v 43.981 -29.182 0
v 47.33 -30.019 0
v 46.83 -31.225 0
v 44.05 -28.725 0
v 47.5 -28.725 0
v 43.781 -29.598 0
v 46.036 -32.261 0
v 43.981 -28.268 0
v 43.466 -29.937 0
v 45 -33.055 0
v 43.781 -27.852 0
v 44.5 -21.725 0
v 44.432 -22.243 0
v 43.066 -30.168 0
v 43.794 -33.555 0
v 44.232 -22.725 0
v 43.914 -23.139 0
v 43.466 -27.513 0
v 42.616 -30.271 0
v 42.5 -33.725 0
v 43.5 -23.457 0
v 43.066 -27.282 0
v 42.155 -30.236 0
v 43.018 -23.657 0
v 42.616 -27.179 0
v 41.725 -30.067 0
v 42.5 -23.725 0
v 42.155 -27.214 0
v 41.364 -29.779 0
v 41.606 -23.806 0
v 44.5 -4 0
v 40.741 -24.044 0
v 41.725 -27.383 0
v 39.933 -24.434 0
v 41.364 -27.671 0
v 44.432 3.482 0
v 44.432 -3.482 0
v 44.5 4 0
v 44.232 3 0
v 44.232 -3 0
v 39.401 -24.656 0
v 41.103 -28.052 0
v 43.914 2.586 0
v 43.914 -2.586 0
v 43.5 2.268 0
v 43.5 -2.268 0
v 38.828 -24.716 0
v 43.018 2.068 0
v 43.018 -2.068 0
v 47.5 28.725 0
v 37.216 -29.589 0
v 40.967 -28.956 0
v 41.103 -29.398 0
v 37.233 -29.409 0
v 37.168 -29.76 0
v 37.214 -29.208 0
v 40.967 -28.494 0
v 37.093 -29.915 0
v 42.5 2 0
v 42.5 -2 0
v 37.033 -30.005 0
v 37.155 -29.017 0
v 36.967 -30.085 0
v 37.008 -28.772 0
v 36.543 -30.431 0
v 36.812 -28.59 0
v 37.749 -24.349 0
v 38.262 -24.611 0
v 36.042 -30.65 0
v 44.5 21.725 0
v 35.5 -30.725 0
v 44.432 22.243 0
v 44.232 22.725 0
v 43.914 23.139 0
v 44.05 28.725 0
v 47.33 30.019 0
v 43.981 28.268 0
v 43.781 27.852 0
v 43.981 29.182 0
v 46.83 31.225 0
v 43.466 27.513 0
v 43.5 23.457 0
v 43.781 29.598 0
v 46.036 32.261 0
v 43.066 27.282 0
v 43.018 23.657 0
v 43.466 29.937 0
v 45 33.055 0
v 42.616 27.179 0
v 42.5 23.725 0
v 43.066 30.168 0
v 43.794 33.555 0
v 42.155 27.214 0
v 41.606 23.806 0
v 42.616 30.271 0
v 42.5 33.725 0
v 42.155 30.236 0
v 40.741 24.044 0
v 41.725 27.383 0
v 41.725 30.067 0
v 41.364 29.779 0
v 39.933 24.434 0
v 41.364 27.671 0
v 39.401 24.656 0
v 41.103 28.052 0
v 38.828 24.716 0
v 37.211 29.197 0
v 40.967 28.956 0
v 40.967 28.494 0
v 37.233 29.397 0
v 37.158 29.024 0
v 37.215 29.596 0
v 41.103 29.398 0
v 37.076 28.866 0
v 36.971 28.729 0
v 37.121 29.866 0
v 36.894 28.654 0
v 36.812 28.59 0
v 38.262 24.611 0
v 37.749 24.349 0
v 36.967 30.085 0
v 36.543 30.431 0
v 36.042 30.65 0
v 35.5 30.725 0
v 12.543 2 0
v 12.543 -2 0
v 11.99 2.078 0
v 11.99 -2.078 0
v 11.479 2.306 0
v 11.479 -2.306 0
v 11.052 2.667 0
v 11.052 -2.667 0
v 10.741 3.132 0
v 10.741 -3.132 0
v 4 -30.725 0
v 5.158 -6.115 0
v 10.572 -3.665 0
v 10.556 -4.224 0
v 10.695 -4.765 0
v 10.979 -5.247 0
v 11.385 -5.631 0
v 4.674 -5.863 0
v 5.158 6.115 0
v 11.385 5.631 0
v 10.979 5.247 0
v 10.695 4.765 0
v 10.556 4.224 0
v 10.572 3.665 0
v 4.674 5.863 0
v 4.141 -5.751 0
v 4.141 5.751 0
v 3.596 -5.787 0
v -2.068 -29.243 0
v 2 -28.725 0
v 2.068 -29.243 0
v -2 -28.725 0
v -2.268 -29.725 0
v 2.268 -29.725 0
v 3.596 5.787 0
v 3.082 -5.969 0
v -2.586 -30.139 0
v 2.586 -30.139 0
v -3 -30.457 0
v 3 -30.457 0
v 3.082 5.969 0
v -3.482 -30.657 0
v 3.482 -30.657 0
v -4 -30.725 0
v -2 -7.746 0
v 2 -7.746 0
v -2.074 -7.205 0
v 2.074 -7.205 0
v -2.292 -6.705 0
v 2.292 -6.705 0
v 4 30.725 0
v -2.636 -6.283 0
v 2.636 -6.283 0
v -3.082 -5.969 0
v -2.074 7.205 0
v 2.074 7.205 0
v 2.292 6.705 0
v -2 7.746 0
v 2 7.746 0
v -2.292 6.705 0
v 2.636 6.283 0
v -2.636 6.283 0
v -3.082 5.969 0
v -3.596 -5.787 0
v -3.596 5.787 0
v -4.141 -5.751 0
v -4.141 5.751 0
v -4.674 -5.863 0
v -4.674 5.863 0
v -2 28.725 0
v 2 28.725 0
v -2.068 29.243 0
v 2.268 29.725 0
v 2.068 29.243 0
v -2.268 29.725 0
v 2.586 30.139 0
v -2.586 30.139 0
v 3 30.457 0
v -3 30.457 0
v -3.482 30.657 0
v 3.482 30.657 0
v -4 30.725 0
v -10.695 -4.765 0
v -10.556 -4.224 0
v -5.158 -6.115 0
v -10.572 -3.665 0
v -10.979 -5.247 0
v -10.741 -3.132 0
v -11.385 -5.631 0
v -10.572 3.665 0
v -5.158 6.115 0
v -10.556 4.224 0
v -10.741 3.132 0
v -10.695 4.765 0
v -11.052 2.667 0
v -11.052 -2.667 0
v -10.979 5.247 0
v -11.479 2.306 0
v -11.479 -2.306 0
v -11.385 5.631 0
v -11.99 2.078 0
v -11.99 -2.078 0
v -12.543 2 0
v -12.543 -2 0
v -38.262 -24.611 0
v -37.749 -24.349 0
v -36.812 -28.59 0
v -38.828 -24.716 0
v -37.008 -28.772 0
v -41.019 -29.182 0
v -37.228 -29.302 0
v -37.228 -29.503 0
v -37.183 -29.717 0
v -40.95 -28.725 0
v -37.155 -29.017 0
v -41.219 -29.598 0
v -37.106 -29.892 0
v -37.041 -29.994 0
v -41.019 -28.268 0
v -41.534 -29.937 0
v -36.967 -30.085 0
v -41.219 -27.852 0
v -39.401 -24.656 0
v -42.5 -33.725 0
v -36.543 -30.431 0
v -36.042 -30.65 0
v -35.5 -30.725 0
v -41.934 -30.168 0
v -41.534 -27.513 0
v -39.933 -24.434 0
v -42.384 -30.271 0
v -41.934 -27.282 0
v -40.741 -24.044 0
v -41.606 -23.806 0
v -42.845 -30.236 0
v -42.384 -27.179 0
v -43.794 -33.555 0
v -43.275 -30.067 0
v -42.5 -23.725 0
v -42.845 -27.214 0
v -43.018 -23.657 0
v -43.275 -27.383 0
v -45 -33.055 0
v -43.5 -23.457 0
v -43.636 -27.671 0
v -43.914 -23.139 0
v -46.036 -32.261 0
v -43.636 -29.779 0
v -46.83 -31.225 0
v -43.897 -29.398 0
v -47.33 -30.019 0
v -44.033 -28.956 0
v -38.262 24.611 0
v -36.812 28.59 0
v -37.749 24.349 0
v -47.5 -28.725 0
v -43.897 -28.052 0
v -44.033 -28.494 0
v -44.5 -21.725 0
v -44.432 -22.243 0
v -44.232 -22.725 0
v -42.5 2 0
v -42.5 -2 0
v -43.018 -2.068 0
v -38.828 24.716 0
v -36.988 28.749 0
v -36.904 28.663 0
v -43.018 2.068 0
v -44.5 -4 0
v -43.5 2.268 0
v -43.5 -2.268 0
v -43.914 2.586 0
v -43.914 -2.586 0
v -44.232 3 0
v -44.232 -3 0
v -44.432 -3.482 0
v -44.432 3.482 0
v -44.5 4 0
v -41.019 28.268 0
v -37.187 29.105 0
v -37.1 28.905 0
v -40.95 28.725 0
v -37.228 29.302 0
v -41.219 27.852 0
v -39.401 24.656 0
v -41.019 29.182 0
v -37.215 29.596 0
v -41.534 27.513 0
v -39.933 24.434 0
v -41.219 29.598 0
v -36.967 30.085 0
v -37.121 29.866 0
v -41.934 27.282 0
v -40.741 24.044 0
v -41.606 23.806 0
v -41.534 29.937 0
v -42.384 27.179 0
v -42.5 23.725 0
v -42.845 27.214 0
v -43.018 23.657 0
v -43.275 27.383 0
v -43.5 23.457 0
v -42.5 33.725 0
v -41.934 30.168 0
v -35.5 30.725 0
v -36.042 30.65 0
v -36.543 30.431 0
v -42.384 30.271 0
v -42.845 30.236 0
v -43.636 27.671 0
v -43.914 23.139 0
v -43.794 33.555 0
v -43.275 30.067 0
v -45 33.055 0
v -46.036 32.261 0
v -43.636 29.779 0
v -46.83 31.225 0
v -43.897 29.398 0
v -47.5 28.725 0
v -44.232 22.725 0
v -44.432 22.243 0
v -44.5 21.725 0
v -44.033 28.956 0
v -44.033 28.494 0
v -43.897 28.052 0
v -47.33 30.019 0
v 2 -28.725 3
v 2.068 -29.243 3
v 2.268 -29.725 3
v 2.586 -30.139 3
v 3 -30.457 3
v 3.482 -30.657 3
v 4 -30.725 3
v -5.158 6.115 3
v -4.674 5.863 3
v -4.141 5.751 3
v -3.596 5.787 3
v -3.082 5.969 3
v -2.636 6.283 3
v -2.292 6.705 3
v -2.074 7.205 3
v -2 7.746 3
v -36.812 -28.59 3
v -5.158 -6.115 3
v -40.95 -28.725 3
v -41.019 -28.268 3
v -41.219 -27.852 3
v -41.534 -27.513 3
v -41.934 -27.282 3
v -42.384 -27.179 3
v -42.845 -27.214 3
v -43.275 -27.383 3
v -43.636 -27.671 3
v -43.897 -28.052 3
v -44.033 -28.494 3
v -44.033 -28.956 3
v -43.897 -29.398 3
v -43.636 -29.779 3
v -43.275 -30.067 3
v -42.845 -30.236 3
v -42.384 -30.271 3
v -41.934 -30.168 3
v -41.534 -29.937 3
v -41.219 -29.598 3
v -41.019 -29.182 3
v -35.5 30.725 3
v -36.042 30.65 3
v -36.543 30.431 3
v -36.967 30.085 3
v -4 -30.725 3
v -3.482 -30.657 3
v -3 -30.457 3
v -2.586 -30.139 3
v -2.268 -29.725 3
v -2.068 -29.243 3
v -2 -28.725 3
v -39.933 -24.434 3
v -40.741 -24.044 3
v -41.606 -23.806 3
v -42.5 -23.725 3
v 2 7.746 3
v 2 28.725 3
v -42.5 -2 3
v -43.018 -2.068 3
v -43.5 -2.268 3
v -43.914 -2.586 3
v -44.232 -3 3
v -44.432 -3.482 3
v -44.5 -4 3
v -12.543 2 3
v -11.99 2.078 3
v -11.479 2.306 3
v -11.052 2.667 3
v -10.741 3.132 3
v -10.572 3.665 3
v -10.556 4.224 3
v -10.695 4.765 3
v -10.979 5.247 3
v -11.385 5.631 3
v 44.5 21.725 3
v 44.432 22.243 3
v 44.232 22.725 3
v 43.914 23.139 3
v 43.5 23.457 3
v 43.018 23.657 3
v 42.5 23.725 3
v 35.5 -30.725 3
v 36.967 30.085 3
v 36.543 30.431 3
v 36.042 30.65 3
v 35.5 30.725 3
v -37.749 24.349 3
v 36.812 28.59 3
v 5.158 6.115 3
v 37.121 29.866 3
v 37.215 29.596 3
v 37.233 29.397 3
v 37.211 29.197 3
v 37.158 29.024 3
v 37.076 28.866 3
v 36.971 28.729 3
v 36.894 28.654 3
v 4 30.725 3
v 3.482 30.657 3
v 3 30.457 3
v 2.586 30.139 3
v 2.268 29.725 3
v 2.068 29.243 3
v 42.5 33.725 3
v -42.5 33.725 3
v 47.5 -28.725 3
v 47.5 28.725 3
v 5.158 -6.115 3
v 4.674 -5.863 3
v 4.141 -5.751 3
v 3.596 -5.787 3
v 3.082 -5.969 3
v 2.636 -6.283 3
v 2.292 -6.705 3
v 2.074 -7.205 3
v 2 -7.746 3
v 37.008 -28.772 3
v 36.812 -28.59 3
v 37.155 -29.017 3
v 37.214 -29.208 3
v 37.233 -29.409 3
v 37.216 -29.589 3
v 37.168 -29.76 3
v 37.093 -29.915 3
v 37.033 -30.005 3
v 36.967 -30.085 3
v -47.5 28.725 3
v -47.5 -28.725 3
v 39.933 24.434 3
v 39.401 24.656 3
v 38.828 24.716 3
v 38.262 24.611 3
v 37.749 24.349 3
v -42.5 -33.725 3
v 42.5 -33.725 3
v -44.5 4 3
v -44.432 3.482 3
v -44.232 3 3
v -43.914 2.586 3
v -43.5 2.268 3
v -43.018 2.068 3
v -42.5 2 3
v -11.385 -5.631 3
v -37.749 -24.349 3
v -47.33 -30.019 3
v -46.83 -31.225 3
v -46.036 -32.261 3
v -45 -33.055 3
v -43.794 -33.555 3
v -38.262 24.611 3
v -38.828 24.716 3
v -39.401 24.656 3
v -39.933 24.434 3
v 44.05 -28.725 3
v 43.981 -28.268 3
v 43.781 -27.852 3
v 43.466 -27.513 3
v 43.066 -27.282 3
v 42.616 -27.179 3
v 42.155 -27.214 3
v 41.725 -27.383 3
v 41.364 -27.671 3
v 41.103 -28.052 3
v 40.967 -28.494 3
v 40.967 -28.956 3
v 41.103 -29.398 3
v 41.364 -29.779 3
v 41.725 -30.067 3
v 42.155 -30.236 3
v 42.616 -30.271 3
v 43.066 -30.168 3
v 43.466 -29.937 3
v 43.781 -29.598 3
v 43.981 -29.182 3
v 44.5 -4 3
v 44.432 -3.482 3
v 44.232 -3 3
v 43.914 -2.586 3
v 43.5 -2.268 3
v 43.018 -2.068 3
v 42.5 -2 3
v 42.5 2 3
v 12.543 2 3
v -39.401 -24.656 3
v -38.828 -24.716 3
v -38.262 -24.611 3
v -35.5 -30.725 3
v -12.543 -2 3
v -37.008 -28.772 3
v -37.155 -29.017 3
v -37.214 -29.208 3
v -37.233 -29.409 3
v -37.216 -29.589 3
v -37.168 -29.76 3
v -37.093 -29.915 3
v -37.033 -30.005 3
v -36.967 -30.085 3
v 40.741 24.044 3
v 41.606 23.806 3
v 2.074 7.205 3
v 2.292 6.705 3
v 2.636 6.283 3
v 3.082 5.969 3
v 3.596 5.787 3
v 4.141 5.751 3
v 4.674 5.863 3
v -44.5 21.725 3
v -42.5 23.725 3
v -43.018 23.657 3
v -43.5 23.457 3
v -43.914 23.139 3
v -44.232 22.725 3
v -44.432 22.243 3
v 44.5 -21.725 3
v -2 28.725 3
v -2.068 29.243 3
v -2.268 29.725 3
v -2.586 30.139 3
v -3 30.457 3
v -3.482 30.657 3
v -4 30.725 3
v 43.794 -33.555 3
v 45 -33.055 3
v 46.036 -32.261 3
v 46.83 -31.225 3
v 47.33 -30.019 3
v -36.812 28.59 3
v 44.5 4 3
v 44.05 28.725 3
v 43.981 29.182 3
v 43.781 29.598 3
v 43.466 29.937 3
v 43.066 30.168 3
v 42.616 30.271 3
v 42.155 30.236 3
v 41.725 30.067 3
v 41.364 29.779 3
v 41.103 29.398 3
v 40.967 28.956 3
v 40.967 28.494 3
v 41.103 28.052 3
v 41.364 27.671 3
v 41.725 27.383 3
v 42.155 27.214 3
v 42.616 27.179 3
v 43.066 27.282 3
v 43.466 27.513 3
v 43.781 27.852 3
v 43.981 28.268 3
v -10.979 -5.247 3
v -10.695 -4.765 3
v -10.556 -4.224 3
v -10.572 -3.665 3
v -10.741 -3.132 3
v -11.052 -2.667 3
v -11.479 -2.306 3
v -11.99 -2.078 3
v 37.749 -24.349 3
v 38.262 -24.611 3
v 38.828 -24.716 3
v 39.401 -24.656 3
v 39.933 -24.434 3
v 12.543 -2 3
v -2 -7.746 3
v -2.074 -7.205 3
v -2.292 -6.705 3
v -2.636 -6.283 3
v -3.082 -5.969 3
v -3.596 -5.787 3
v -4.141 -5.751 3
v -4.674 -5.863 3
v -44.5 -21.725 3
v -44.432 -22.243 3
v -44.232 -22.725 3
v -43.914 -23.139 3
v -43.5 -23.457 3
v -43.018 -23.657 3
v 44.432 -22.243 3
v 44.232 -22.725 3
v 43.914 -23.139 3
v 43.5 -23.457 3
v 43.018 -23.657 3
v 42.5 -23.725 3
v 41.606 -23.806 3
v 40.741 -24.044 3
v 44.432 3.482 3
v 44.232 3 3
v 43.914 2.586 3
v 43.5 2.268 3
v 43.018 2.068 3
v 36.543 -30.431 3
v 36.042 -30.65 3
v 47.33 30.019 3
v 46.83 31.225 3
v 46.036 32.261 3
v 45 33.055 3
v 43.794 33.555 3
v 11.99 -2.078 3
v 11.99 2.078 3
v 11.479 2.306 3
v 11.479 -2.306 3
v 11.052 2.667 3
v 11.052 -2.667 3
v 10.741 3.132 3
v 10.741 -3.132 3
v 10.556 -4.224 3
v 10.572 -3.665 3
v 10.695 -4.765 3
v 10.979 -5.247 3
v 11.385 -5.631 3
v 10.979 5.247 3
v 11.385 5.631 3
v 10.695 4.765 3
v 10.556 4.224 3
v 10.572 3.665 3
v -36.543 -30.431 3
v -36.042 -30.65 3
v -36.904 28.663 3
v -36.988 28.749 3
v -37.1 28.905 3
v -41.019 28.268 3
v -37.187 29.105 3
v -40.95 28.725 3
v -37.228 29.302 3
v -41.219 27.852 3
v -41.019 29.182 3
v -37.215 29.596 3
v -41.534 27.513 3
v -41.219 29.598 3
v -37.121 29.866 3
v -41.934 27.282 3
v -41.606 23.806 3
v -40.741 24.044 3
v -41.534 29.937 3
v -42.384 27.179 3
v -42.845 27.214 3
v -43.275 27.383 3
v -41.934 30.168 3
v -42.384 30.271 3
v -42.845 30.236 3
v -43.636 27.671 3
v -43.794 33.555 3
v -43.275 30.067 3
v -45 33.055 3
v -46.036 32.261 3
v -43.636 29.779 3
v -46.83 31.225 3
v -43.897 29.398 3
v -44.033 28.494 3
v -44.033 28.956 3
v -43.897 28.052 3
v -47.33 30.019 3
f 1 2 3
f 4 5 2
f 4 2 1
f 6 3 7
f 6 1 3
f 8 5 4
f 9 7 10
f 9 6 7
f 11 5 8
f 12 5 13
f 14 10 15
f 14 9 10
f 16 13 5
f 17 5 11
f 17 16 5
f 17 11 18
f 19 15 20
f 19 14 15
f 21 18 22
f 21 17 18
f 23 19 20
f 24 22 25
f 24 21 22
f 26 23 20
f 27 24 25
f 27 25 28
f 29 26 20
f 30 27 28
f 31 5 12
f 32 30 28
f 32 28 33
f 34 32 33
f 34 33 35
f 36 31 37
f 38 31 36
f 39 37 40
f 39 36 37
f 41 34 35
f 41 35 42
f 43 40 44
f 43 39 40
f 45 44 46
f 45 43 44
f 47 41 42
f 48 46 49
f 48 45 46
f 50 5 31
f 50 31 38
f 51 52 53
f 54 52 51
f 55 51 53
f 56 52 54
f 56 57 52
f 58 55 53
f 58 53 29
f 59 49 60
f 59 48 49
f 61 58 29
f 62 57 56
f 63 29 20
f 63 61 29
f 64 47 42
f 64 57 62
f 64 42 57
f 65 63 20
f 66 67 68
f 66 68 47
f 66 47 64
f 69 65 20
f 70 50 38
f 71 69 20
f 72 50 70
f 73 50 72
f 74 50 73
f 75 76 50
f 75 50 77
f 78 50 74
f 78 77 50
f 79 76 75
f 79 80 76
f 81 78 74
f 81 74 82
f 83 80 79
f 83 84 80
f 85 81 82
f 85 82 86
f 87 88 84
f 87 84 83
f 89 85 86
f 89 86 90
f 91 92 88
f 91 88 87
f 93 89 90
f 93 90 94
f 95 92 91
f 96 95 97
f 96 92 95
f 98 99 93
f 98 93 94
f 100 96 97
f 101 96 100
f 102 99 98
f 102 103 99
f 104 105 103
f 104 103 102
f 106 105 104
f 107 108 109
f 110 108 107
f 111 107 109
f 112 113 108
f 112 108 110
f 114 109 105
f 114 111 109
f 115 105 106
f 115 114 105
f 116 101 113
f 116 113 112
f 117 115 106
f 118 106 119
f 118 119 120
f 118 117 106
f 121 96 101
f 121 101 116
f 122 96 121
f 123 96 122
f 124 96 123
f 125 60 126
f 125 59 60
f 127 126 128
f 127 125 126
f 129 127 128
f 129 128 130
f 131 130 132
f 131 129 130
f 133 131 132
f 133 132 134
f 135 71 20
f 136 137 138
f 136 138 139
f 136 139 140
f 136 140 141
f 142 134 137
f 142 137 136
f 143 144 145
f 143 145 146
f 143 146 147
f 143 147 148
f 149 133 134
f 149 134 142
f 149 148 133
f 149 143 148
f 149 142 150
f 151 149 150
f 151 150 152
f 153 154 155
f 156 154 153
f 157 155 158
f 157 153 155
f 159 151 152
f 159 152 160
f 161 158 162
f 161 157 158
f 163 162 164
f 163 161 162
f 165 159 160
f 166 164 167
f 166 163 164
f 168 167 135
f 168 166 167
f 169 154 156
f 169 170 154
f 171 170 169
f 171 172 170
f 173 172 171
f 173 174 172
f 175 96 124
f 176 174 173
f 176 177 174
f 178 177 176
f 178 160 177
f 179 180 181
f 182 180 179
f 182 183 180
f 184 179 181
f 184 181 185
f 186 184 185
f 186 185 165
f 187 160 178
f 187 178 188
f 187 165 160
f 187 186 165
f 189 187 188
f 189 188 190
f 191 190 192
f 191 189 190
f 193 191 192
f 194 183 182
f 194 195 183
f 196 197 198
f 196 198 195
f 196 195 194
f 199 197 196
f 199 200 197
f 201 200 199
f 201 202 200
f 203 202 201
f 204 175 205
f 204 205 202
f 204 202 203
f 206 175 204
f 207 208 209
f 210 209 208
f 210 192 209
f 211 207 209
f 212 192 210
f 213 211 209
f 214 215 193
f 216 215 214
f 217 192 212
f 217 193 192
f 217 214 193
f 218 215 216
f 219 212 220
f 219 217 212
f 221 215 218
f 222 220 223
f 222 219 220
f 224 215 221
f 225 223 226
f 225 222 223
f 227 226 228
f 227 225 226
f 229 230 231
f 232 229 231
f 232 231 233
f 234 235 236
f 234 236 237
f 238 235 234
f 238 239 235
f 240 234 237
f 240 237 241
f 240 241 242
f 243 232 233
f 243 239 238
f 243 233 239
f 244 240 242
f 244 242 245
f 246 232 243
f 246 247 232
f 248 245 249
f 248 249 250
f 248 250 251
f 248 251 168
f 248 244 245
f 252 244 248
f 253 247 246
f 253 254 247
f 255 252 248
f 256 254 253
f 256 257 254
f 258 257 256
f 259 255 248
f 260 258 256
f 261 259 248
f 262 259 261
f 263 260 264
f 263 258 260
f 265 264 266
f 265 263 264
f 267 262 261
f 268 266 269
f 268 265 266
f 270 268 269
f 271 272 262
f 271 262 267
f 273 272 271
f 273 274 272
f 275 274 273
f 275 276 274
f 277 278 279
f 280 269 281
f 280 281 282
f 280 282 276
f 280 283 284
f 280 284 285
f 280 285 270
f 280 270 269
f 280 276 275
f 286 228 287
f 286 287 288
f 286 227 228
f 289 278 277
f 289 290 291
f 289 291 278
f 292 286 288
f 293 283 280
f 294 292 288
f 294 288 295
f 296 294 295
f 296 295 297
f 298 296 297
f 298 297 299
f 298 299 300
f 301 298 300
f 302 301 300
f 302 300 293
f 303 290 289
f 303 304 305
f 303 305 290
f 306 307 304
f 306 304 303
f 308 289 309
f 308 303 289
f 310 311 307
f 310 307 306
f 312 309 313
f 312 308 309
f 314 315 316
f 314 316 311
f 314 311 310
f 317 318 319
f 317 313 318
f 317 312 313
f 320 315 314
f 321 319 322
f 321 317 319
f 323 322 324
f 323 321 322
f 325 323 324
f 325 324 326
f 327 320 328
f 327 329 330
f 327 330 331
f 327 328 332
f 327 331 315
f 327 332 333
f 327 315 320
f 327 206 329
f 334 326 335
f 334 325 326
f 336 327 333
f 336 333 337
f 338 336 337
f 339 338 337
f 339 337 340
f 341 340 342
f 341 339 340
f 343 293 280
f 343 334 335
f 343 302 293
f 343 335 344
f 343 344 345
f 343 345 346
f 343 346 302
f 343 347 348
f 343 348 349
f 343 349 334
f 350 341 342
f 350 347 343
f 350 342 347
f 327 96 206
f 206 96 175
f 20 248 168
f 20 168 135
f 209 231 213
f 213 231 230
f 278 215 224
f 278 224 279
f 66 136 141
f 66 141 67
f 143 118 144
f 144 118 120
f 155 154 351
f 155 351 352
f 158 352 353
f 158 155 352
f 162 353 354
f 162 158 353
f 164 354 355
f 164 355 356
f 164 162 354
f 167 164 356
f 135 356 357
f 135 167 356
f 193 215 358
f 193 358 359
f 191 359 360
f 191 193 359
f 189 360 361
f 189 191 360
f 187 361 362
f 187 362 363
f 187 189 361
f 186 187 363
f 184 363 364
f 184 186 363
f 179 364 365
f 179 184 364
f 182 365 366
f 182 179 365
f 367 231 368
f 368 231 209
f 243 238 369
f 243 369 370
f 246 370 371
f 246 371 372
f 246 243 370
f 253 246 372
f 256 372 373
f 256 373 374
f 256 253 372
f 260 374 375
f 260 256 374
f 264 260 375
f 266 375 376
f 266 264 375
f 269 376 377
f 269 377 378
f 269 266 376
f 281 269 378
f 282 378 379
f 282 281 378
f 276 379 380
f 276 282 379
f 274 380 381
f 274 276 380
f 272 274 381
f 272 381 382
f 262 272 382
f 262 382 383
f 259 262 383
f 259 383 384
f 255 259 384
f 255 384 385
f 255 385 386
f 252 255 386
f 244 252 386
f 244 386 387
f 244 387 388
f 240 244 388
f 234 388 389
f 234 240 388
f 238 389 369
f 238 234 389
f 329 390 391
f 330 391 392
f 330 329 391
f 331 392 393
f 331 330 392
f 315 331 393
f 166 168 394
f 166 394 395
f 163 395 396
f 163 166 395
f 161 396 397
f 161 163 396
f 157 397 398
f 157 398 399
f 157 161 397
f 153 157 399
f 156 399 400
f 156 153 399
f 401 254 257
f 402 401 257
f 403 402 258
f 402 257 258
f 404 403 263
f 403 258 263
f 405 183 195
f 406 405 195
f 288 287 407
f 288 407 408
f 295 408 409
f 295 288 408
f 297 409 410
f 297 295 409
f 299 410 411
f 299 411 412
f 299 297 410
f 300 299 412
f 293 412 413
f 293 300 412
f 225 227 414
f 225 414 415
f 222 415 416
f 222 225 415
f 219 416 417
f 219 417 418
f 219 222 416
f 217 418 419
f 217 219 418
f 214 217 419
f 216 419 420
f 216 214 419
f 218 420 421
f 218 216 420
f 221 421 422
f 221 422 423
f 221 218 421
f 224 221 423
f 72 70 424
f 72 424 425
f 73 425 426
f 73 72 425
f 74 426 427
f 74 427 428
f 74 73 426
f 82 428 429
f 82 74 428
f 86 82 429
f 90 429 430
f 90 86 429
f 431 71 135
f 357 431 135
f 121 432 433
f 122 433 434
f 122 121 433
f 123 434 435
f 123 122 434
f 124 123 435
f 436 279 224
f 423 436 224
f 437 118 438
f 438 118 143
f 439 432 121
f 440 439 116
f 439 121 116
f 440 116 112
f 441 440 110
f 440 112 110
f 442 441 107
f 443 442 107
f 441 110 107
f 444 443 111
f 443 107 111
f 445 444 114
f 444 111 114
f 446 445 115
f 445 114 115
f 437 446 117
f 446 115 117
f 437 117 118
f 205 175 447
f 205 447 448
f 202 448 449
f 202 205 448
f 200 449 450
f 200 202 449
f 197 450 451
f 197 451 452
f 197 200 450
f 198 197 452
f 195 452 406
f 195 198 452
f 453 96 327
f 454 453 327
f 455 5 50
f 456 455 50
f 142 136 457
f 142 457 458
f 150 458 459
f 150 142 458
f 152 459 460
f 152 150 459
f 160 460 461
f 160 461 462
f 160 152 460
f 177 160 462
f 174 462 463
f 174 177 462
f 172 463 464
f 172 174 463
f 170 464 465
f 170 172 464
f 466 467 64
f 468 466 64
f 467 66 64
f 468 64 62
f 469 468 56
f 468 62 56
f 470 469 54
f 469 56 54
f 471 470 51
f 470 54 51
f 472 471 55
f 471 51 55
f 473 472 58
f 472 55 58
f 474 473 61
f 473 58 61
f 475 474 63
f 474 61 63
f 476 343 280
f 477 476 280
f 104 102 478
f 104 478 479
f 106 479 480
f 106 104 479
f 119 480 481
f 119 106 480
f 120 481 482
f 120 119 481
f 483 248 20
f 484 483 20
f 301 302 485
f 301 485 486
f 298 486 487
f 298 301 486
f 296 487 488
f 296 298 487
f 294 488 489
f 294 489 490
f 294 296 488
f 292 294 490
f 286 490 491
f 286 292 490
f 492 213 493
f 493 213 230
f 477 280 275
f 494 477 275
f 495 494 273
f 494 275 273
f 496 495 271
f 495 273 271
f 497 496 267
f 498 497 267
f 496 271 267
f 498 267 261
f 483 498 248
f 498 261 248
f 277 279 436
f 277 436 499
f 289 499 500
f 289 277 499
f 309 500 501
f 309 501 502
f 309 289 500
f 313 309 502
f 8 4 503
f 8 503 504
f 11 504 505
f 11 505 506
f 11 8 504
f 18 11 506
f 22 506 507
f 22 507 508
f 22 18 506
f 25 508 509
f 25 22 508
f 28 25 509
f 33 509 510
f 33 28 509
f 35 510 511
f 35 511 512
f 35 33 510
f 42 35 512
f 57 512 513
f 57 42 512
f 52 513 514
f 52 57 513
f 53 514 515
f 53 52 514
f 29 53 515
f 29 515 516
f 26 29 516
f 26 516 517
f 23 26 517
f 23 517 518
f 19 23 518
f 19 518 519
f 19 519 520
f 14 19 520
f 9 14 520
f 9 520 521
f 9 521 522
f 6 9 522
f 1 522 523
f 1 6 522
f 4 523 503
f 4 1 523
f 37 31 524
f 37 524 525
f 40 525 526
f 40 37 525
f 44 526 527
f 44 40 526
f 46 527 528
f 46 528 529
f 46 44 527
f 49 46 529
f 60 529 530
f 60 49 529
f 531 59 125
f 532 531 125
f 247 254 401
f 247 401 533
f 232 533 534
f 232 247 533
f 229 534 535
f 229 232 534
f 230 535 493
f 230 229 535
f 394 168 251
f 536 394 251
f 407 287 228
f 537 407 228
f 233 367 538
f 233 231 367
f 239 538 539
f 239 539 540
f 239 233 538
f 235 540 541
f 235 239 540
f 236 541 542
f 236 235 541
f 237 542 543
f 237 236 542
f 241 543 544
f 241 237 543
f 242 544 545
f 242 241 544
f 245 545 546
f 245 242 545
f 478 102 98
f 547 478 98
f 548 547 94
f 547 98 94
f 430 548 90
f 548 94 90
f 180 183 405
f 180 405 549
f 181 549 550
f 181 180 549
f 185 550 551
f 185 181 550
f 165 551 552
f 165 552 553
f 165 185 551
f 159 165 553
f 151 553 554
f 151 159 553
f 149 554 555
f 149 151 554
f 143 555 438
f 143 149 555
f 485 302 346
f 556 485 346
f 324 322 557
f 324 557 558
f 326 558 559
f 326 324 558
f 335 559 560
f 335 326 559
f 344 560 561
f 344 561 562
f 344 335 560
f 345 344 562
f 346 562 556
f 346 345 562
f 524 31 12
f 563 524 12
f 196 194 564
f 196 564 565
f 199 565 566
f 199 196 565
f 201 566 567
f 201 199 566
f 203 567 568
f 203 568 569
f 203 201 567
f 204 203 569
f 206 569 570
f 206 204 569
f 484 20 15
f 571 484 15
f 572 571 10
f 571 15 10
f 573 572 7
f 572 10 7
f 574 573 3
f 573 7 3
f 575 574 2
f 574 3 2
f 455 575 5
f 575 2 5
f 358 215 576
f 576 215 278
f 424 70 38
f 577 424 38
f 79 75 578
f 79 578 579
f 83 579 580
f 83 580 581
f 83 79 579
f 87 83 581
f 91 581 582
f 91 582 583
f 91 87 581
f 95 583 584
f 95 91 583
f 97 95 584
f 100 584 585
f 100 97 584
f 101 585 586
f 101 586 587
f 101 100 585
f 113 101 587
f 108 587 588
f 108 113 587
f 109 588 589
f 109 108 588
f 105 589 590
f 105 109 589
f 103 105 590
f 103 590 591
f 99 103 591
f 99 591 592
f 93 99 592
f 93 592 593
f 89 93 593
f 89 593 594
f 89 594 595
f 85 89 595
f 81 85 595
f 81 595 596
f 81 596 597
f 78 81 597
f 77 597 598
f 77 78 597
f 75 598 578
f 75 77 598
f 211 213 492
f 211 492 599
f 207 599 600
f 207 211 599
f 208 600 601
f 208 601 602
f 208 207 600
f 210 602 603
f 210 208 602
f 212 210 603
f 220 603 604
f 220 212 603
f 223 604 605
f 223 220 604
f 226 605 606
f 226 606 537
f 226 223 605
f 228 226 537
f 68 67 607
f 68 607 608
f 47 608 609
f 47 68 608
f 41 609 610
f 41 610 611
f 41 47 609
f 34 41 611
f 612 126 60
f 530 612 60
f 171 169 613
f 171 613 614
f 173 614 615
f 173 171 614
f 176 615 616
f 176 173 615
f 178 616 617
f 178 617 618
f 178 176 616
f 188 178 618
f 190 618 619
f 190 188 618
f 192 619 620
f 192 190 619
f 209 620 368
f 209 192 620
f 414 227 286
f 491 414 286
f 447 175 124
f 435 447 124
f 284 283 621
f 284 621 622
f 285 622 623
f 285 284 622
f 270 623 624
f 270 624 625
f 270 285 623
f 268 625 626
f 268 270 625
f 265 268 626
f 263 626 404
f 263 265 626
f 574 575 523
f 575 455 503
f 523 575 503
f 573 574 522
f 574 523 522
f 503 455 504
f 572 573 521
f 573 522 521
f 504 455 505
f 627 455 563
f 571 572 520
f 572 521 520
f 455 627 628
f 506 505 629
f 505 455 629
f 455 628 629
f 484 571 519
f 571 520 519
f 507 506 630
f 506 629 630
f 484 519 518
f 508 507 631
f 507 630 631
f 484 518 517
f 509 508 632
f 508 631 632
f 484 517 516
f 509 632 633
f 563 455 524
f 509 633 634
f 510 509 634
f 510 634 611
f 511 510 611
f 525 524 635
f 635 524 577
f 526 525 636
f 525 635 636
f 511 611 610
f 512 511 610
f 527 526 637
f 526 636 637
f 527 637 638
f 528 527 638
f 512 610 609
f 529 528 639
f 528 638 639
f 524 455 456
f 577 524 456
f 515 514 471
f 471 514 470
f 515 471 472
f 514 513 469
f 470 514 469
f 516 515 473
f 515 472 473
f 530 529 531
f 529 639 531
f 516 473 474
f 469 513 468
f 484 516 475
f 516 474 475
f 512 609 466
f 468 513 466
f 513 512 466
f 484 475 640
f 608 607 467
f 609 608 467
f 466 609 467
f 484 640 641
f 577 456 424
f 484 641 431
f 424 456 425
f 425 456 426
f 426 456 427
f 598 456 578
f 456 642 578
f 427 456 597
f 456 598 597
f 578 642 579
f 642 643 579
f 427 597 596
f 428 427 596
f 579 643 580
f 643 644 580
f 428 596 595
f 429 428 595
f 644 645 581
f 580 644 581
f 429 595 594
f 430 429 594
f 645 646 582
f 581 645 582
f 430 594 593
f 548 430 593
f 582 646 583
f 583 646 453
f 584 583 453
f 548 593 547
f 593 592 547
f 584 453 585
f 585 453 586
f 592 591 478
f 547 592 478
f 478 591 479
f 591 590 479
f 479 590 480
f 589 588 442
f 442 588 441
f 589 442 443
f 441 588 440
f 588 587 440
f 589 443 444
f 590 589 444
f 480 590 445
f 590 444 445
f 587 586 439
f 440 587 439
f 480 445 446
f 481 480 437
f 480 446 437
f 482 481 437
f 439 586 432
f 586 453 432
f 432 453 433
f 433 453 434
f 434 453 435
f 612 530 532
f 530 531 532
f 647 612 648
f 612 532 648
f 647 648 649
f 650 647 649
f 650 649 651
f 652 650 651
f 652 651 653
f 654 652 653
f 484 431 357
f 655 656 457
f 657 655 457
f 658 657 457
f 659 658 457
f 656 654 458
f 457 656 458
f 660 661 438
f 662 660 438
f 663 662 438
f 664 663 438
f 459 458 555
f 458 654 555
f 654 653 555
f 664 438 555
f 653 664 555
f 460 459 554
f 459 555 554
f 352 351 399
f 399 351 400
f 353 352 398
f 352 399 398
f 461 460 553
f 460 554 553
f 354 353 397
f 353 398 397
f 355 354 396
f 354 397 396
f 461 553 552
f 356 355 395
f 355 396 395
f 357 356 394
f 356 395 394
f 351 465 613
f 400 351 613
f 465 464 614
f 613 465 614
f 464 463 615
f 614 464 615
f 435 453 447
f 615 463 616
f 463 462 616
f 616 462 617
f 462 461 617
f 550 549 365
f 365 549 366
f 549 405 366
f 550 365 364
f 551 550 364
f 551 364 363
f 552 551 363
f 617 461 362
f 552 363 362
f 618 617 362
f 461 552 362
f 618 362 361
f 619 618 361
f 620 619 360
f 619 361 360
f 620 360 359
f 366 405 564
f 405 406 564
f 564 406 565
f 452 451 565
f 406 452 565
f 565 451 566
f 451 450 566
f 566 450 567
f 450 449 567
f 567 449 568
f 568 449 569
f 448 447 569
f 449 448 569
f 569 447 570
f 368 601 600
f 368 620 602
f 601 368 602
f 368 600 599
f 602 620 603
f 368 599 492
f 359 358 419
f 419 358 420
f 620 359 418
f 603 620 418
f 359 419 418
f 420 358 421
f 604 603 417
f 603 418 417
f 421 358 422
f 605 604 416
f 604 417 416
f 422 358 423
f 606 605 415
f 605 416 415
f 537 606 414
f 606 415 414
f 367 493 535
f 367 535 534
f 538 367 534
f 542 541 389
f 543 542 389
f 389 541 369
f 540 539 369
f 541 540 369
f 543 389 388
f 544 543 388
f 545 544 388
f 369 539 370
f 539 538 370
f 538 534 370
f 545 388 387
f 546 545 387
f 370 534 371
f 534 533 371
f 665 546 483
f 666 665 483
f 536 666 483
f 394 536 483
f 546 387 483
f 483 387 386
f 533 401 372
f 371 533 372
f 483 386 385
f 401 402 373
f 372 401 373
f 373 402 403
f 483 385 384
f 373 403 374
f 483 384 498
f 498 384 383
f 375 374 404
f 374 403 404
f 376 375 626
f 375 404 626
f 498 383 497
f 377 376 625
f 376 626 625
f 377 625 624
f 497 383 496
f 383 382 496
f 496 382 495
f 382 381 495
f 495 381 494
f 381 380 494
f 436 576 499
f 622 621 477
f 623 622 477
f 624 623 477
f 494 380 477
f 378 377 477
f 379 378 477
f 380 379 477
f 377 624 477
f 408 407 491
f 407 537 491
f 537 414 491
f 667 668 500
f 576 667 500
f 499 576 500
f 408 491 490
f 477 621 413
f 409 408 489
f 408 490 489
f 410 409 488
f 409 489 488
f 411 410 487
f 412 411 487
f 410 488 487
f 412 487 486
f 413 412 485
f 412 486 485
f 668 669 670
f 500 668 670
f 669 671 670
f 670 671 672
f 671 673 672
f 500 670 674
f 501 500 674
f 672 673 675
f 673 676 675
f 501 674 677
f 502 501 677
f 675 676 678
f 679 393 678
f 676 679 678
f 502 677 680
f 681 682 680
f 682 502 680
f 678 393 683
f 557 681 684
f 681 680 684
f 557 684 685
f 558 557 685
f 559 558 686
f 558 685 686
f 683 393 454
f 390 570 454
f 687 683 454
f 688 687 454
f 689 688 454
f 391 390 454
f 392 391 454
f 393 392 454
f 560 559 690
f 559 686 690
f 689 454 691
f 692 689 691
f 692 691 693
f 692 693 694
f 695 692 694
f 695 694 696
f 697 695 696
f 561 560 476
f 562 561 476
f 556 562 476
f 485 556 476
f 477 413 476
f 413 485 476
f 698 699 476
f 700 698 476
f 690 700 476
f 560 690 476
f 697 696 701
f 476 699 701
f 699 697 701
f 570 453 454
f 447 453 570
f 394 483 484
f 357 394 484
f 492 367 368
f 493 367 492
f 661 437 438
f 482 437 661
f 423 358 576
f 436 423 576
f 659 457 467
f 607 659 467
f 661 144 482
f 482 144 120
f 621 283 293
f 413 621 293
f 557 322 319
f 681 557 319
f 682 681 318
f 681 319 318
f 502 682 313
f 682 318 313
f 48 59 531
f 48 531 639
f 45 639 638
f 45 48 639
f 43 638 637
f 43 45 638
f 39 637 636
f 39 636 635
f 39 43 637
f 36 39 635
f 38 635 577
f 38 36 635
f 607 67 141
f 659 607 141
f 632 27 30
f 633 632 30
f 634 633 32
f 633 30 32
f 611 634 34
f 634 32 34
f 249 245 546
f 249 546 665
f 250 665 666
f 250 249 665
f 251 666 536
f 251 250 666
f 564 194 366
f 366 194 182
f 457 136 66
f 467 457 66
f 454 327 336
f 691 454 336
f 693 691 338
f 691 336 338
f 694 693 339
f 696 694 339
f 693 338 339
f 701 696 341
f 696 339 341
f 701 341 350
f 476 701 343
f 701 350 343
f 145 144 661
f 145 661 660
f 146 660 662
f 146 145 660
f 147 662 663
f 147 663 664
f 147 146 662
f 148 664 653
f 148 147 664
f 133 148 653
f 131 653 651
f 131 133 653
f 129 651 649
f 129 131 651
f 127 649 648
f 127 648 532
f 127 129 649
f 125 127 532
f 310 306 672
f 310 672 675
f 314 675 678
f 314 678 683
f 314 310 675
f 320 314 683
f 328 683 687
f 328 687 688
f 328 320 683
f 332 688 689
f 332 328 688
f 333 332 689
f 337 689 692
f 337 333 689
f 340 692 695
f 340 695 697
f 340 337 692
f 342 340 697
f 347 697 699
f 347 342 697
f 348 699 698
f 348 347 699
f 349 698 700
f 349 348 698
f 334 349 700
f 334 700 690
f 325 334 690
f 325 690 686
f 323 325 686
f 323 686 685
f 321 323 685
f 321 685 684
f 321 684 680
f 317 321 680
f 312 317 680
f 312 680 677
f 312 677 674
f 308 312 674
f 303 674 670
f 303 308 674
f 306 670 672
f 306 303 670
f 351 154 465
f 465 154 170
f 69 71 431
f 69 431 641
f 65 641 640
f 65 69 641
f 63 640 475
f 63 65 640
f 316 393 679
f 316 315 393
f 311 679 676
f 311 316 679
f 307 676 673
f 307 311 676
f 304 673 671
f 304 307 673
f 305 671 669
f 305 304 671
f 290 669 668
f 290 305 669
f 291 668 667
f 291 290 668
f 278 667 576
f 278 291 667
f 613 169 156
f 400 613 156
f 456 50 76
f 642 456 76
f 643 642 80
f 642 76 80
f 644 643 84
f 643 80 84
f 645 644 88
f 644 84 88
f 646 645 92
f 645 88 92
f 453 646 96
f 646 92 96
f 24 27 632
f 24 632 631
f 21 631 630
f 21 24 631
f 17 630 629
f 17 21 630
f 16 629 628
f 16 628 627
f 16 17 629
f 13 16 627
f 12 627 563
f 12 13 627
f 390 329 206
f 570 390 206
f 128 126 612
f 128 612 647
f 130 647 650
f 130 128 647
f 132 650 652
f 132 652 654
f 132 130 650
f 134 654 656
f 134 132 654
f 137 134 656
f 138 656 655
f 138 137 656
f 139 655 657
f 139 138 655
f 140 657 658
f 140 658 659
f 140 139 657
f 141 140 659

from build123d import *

# Parameters (mm, degrees)
SKETCH_1_R      = 5
SKETCH_1_R_2    = 1.55
EXTRUDE_1_DEPTH = 3
FILLET_1_R      = 2
FILLET_2_R      = 1


with BuildPart() as part:
    # 草图1 → 凸台-拉伸1 (new body)
    # profile 1 of 5: a face of its own
    with BuildSketch(Plane.XY):
        with BuildLine():
            Line((-42.5, -33.725), (42.5, -33.725))
            ThreePointArc((42.5, -33.725), (39.761387212, -32.908300133), (37.917424305, -30.725))
            Line((37.917424305, -30.725), (2, -30.725))
            Line((2, -30.725), (2, -3.872835094))
            Line((2, -3.872835094), (37.513133211, -29.087159674))
            ThreePointArc((37.513133211, -29.087159674), (37.811061724, -26.988953387), (38.951354438, -25.202626557))
            Line((38.951354438, -25.202626557), (6.271598724, -2))
            Line((6.271598724, -2), (44.5, -2))
            Line((44.5, -2), (44.5, -24.142424305))
            ThreePointArc((44.5, -24.142424305), (46.683300133, -25.986387212), (47.5, -28.725))
            Line((47.5, -28.725), (47.5, 28.725))
            ThreePointArc((47.5, 28.725), (46.683300133, 25.986387212), (44.5, 24.142424305))
            Line((44.5, 24.142424305), (44.5, 2))
            Line((44.5, 2), (6.271598724, 2))
            Line((6.271598724, 2), (38.951354438, 25.202626557))
            ThreePointArc((38.951354438, 25.202626557), (37.811061724, 26.988953387), (37.513133211, 29.087159674))
            Line((37.513133211, 29.087159674), (2, 3.872835094))
            Line((2, 3.872835094), (2, 30.725))
            Line((2, 30.725), (37.917424305, 30.725))
            ThreePointArc((37.917424305, 30.725), (39.761387212, 32.908300133), (42.5, 33.725))
            Line((42.5, 33.725), (-42.5, 33.725))
            ThreePointArc((-42.5, 33.725), (-39.761387212, 32.908300133), (-37.917424305, 30.725))
            Line((-37.917424305, 30.725), (-2, 30.725))
            Line((-2, 30.725), (-2, 3.872835094))
            Line((-2, 3.872835094), (-37.513133211, 29.087159674))
            ThreePointArc((-37.513133211, 29.087159674), (-37.503284381, 28.906198862), (-37.5, 28.725))
            ThreePointArc((-37.5, 28.725), (-37.87705571, 26.820167699), (-38.951354438, 25.202626557))
            Line((-38.951354438, 25.202626557), (-6.271598724, 2))
            Line((-6.271598724, 2), (-44.5, 2))
            Line((-44.5, 2), (-44.5, 24.142424305))
            ThreePointArc((-44.5, 24.142424305), (-46.683300133, 25.986387212), (-47.5, 28.725))
            Line((-47.5, 28.725), (-47.5, -28.725))
            ThreePointArc((-47.5, -28.725), (-46.683300133, -25.986387212), (-44.5, -24.142424305))
            Line((-44.5, -24.142424305), (-44.5, -2))
            Line((-44.5, -2), (-6.271598724, -2))
            Line((-6.271598724, -2), (-38.951354438, -25.202626557))
            ThreePointArc((-38.951354438, -25.202626557), (-37.87705571, -26.820167699), (-37.5, -28.725))
            ThreePointArc((-37.5, -28.725), (-37.503284381, -28.906198862), (-37.513133211, -29.087159674))
            Line((-37.513133211, -29.087159674), (-2, -3.872835094))
            Line((-2, -3.872835094), (-2, -30.725))
            Line((-2, -30.725), (-37.917424305, -30.725))
            ThreePointArc((-37.917424305, -30.725), (-39.761387212, -32.908300133), (-42.5, -33.725))
        make_face()
    # profile 2 of 5: a face of its own
    with BuildSketch(Plane.XY):
        with Locations((-42.5, 28.725)):
            Circle(SKETCH_1_R)
        with Locations((-42.5, 28.725)):
            Circle(SKETCH_1_R_2, mode=Mode.SUBTRACT)
    # profile 3 of 5: a face of its own
    with BuildSketch(Plane.XY):
        with Locations((42.5, 28.725)):
            Circle(SKETCH_1_R)
        with Locations((42.5, 28.725)):
            Circle(SKETCH_1_R_2, mode=Mode.SUBTRACT)
    # profile 4 of 5: a face of its own
    with BuildSketch(Plane.XY):
        with Locations((42.5, -28.725)):
            Circle(SKETCH_1_R)
        with Locations((42.5, -28.725)):
            Circle(SKETCH_1_R_2, mode=Mode.SUBTRACT)
    # profile 5 of 5: a face of its own
    with BuildSketch(Plane.XY):
        with Locations((-42.5, -28.725)):
            Circle(SKETCH_1_R)
        with Locations((-42.5, -28.725)):
            Circle(SKETCH_1_R_2, mode=Mode.SUBTRACT)
    extrude(amount=EXTRUDE_1_DEPTH)

    # 圆角1
    # the kernel refuses this fillet: 2 mm, written as the material it adds along each edge
    with BuildSketch(Plane(origin=(38.951354438, 25.202626557, 0), x_dir=(-0.8153829846202765, -0.5789219190803973, 0), z_dir=(0, 0, 1)), Plane(origin=(-38.951354438, -25.202626557, 0), x_dir=(0.8153829846202759, 0.5789219190803978, 0), z_dir=(0, 0, 1))) as fillet_1_piece_1:
        with BuildLine():
            CenterArc((1.475169897, 2), FILLET_1_R, 203.736299512, 66.263700488)
            ThreePointArc((-0.355645617, 1.194944379), (-0.140432135, 0.608600598), (0, 0))
            Line((0, 0), (1.475169897, 0))
        make_face()
    extrude(amount=3)
    with BuildSketch(Plane(origin=(6.271598724, 2, 0), x_dir=(1, 0, 0), z_dir=(0, 0, 1)), Plane(origin=(6.271598724, -2, 0), x_dir=(0.8153829846202769, -0.5789219190803966, 0), z_dir=(0, 0, 1)), Plane(origin=(-6.271598724, -2, 0), x_dir=(-1, 0, 0), z_dir=(0, 0, 1)), Plane(origin=(-6.271598724, 2, 0), x_dir=(-0.8153829846202769, 0.5789219190803967, 0), z_dir=(0, 0, 1))) as fillet_1_piece_2:
        with BuildLine():
            CenterArc((FILLET_1_R * 3.13579936221, FILLET_1_R), FILLET_1_R, 125.374751844, 144.625248156)
            Line((FILLET_1_R * 2.55687744313, FILLET_1_R * 1.81538298462), (0, 0))
            Line((0, 0), (FILLET_1_R * 3.13579936221, 0))
        make_face()
    extrude(amount=3)
    with BuildSketch(Plane(origin=(44.5, 2, 0), x_dir=(0, 1, 0), z_dir=(0, 0, 1)), Plane(origin=(44.5, -2, 0), x_dir=(-1, 0, 0), z_dir=(0, 0, 1)), Plane(origin=(2, -30.725, 0), x_dir=(1, 0, 0), z_dir=(0, 0, 1)), Plane(origin=(-2, -30.725, 0), x_dir=(0, 1, 0), z_dir=(0, 0, 1)), Plane(origin=(-44.5, -2, 0), x_dir=(0, -1, 0), z_dir=(0, 0, 1)), Plane(origin=(-44.5, 2, 0), x_dir=(1, 0, 0), z_dir=(0, 0, 1)), Plane(origin=(-2, 30.725, 0), x_dir=(-1, 0, 0), z_dir=(0, 0, 1)), Plane(origin=(2, 30.725, 0), x_dir=(0, -1, 0), z_dir=(0, 0, 1))) as fillet_1_piece_3:
        with BuildLine():
            CenterArc((FILLET_1_R, FILLET_1_R), FILLET_1_R, 180, 90)
            Line((0, FILLET_1_R), (0, 0))
            Line((0, 0), (FILLET_1_R, 0))
        make_face()
    extrude(amount=3)
    with BuildSketch(Plane(origin=(44.5, 24.142424305, 0), x_dir=(0, -1, 0), z_dir=(0, 0, 1)), Plane(origin=(37.917424305, -30.725, 0), x_dir=(-1, 0, 0), z_dir=(0, 0, 1)), Plane(origin=(-44.5, -24.142424305, 0), x_dir=(0, 1, 0), z_dir=(0, 0, 1)), Plane(origin=(-37.917424305, 30.725, 0), x_dir=(1, 0, 0), z_dir=(0, 0, 1))) as fillet_1_piece_4:
        with BuildLine():
            CenterArc((2.417424305, -2), FILLET_1_R, 90, 90)
            ThreePointArc((0.417424305, -2), (0.31195587, -0.978451782), (0, 0))
            Line((0, 0), (2.417424305, 0))
        make_face()
    extrude(amount=3)
    with BuildSketch(Plane(origin=(44.5, -24.142424305, 0), x_dir=(0, 1, 0), z_dir=(0, 0, 1)), Plane(origin=(-37.917424305, -30.725, 0), x_dir=(1, 0, 0), z_dir=(0, 0, 1)), Plane(origin=(-44.5, 24.142424305, 0), x_dir=(0, -1, 0), z_dir=(0, 0, 1)), Plane(origin=(37.917424305, 30.725, 0), x_dir=(-1, 0, 0), z_dir=(0, 0, 1))) as fillet_1_piece_5:
        with BuildLine():
            CenterArc((2.417424305, 2), FILLET_1_R, 180, 90)
            ThreePointArc((0.417424305, 2), (0.31195587, 0.978451782), (0, 0))
            Line((0, 0), (2.417424305, 0))
        make_face()
    extrude(amount=3)
    with BuildSketch(Plane(origin=(38.951354438, -25.202626557, 0), x_dir=(-0.8153829846202785, 0.5789219190803946, 0), z_dir=(0, 0, 1)), Plane(origin=(-38.951354438, 25.202626557, 0), x_dir=(0.8153829846202768, -0.5789219190803968, 0), z_dir=(0, 0, 1))) as fillet_1_piece_6:
        with BuildLine():
            CenterArc((1.475169897, -2), FILLET_1_R, 90, 66.263700488)
            ThreePointArc((-0.355645617, -1.194944379), (-0.140432135, -0.608600598), (0, 0))
            Line((0, 0), (1.475169897, 0))
        make_face()
    extrude(amount=3)
    with BuildSketch(Plane(origin=(2, -3.872835094, 0), x_dir=(0, -1, 0), z_dir=(0, 0, 1)), Plane(origin=(-2, -3.872835094, 0), x_dir=(-0.8153829846202767, -0.5789219190803968, 0), z_dir=(0, 0, 1)), Plane(origin=(-2, 3.872835094, 0), x_dir=(0, 1, 0), z_dir=(0, 0, 1)), Plane(origin=(2, 3.872835094, 0), x_dir=(0.8153829846202766, 0.578921919080397, 0), z_dir=(0, 0, 1))) as fillet_1_piece_7:
        with BuildLine():
            CenterArc((FILLET_1_R * 1.93641754717, FILLET_1_R), FILLET_1_R, 144.625248156, 125.374751844)
            Line((FILLET_1_R * 1.12103456255, FILLET_1_R * 1.57892191908), (0, 0))
            Line((0, 0), (FILLET_1_R * 1.93641754717, 0))
        make_face()
    extrude(amount=3)
    with BuildSketch(Plane(origin=(37.513133211, -29.087159674, 0), x_dir=(-0.8153829846202749, 0.5789219190803994, 0), z_dir=(0, 0, 1)), Plane(origin=(-37.513133211, 29.087159674, 0), x_dir=(0.8153829846202781, -0.5789219190803949, 0), z_dir=(0, 0, 1))) as fillet_1_piece_8:
        with BuildLine():
            CenterArc((0.849166367, 2), FILLET_1_R, 227.759477208, 42.240522792)
            ThreePointArc((-0.495322353, 0.519341335), (-0.23833117, 0.268569172), (0, 0))
            Line((0, 0), (0.849166367, 0))
        make_face()
    extrude(amount=3)
    with BuildSketch(Plane(origin=(-37.513133211, -29.087159674, 0), x_dir=(0.8153829846202739, 0.5789219190804008, 0), z_dir=(0, 0, 1)), Plane(origin=(37.513133211, 29.087159674, 0), x_dir=(-0.8153829846202756, -0.5789219190803985, 0), z_dir=(0, 0, 1))) as fillet_1_piece_9:
        with BuildLine():
            CenterArc((0.849166367, -2), FILLET_1_R, 90, 42.240522792)
            ThreePointArc((-0.495322353, -0.519341335), (-0.23833117, -0.268569172), (0, 0))
            Line((0, 0), (0.849166367, 0))
        make_face()
    extrude(amount=3)

    # 圆角2
    fillet_2_edges = [part.edges().sort_by_distance(p)[0] for p in [
        (-37.422632563, 29.275893843, 1.5),
        (-37.422632563, -29.275893843, 1.5),
        (37.422632563, -29.275893843, 1.5),
        (37.422632563, 29.275893843, 1.5),
    ]]
    fillet(fillet_2_edges, radius=FILLET_2_R)


solid = part.part
